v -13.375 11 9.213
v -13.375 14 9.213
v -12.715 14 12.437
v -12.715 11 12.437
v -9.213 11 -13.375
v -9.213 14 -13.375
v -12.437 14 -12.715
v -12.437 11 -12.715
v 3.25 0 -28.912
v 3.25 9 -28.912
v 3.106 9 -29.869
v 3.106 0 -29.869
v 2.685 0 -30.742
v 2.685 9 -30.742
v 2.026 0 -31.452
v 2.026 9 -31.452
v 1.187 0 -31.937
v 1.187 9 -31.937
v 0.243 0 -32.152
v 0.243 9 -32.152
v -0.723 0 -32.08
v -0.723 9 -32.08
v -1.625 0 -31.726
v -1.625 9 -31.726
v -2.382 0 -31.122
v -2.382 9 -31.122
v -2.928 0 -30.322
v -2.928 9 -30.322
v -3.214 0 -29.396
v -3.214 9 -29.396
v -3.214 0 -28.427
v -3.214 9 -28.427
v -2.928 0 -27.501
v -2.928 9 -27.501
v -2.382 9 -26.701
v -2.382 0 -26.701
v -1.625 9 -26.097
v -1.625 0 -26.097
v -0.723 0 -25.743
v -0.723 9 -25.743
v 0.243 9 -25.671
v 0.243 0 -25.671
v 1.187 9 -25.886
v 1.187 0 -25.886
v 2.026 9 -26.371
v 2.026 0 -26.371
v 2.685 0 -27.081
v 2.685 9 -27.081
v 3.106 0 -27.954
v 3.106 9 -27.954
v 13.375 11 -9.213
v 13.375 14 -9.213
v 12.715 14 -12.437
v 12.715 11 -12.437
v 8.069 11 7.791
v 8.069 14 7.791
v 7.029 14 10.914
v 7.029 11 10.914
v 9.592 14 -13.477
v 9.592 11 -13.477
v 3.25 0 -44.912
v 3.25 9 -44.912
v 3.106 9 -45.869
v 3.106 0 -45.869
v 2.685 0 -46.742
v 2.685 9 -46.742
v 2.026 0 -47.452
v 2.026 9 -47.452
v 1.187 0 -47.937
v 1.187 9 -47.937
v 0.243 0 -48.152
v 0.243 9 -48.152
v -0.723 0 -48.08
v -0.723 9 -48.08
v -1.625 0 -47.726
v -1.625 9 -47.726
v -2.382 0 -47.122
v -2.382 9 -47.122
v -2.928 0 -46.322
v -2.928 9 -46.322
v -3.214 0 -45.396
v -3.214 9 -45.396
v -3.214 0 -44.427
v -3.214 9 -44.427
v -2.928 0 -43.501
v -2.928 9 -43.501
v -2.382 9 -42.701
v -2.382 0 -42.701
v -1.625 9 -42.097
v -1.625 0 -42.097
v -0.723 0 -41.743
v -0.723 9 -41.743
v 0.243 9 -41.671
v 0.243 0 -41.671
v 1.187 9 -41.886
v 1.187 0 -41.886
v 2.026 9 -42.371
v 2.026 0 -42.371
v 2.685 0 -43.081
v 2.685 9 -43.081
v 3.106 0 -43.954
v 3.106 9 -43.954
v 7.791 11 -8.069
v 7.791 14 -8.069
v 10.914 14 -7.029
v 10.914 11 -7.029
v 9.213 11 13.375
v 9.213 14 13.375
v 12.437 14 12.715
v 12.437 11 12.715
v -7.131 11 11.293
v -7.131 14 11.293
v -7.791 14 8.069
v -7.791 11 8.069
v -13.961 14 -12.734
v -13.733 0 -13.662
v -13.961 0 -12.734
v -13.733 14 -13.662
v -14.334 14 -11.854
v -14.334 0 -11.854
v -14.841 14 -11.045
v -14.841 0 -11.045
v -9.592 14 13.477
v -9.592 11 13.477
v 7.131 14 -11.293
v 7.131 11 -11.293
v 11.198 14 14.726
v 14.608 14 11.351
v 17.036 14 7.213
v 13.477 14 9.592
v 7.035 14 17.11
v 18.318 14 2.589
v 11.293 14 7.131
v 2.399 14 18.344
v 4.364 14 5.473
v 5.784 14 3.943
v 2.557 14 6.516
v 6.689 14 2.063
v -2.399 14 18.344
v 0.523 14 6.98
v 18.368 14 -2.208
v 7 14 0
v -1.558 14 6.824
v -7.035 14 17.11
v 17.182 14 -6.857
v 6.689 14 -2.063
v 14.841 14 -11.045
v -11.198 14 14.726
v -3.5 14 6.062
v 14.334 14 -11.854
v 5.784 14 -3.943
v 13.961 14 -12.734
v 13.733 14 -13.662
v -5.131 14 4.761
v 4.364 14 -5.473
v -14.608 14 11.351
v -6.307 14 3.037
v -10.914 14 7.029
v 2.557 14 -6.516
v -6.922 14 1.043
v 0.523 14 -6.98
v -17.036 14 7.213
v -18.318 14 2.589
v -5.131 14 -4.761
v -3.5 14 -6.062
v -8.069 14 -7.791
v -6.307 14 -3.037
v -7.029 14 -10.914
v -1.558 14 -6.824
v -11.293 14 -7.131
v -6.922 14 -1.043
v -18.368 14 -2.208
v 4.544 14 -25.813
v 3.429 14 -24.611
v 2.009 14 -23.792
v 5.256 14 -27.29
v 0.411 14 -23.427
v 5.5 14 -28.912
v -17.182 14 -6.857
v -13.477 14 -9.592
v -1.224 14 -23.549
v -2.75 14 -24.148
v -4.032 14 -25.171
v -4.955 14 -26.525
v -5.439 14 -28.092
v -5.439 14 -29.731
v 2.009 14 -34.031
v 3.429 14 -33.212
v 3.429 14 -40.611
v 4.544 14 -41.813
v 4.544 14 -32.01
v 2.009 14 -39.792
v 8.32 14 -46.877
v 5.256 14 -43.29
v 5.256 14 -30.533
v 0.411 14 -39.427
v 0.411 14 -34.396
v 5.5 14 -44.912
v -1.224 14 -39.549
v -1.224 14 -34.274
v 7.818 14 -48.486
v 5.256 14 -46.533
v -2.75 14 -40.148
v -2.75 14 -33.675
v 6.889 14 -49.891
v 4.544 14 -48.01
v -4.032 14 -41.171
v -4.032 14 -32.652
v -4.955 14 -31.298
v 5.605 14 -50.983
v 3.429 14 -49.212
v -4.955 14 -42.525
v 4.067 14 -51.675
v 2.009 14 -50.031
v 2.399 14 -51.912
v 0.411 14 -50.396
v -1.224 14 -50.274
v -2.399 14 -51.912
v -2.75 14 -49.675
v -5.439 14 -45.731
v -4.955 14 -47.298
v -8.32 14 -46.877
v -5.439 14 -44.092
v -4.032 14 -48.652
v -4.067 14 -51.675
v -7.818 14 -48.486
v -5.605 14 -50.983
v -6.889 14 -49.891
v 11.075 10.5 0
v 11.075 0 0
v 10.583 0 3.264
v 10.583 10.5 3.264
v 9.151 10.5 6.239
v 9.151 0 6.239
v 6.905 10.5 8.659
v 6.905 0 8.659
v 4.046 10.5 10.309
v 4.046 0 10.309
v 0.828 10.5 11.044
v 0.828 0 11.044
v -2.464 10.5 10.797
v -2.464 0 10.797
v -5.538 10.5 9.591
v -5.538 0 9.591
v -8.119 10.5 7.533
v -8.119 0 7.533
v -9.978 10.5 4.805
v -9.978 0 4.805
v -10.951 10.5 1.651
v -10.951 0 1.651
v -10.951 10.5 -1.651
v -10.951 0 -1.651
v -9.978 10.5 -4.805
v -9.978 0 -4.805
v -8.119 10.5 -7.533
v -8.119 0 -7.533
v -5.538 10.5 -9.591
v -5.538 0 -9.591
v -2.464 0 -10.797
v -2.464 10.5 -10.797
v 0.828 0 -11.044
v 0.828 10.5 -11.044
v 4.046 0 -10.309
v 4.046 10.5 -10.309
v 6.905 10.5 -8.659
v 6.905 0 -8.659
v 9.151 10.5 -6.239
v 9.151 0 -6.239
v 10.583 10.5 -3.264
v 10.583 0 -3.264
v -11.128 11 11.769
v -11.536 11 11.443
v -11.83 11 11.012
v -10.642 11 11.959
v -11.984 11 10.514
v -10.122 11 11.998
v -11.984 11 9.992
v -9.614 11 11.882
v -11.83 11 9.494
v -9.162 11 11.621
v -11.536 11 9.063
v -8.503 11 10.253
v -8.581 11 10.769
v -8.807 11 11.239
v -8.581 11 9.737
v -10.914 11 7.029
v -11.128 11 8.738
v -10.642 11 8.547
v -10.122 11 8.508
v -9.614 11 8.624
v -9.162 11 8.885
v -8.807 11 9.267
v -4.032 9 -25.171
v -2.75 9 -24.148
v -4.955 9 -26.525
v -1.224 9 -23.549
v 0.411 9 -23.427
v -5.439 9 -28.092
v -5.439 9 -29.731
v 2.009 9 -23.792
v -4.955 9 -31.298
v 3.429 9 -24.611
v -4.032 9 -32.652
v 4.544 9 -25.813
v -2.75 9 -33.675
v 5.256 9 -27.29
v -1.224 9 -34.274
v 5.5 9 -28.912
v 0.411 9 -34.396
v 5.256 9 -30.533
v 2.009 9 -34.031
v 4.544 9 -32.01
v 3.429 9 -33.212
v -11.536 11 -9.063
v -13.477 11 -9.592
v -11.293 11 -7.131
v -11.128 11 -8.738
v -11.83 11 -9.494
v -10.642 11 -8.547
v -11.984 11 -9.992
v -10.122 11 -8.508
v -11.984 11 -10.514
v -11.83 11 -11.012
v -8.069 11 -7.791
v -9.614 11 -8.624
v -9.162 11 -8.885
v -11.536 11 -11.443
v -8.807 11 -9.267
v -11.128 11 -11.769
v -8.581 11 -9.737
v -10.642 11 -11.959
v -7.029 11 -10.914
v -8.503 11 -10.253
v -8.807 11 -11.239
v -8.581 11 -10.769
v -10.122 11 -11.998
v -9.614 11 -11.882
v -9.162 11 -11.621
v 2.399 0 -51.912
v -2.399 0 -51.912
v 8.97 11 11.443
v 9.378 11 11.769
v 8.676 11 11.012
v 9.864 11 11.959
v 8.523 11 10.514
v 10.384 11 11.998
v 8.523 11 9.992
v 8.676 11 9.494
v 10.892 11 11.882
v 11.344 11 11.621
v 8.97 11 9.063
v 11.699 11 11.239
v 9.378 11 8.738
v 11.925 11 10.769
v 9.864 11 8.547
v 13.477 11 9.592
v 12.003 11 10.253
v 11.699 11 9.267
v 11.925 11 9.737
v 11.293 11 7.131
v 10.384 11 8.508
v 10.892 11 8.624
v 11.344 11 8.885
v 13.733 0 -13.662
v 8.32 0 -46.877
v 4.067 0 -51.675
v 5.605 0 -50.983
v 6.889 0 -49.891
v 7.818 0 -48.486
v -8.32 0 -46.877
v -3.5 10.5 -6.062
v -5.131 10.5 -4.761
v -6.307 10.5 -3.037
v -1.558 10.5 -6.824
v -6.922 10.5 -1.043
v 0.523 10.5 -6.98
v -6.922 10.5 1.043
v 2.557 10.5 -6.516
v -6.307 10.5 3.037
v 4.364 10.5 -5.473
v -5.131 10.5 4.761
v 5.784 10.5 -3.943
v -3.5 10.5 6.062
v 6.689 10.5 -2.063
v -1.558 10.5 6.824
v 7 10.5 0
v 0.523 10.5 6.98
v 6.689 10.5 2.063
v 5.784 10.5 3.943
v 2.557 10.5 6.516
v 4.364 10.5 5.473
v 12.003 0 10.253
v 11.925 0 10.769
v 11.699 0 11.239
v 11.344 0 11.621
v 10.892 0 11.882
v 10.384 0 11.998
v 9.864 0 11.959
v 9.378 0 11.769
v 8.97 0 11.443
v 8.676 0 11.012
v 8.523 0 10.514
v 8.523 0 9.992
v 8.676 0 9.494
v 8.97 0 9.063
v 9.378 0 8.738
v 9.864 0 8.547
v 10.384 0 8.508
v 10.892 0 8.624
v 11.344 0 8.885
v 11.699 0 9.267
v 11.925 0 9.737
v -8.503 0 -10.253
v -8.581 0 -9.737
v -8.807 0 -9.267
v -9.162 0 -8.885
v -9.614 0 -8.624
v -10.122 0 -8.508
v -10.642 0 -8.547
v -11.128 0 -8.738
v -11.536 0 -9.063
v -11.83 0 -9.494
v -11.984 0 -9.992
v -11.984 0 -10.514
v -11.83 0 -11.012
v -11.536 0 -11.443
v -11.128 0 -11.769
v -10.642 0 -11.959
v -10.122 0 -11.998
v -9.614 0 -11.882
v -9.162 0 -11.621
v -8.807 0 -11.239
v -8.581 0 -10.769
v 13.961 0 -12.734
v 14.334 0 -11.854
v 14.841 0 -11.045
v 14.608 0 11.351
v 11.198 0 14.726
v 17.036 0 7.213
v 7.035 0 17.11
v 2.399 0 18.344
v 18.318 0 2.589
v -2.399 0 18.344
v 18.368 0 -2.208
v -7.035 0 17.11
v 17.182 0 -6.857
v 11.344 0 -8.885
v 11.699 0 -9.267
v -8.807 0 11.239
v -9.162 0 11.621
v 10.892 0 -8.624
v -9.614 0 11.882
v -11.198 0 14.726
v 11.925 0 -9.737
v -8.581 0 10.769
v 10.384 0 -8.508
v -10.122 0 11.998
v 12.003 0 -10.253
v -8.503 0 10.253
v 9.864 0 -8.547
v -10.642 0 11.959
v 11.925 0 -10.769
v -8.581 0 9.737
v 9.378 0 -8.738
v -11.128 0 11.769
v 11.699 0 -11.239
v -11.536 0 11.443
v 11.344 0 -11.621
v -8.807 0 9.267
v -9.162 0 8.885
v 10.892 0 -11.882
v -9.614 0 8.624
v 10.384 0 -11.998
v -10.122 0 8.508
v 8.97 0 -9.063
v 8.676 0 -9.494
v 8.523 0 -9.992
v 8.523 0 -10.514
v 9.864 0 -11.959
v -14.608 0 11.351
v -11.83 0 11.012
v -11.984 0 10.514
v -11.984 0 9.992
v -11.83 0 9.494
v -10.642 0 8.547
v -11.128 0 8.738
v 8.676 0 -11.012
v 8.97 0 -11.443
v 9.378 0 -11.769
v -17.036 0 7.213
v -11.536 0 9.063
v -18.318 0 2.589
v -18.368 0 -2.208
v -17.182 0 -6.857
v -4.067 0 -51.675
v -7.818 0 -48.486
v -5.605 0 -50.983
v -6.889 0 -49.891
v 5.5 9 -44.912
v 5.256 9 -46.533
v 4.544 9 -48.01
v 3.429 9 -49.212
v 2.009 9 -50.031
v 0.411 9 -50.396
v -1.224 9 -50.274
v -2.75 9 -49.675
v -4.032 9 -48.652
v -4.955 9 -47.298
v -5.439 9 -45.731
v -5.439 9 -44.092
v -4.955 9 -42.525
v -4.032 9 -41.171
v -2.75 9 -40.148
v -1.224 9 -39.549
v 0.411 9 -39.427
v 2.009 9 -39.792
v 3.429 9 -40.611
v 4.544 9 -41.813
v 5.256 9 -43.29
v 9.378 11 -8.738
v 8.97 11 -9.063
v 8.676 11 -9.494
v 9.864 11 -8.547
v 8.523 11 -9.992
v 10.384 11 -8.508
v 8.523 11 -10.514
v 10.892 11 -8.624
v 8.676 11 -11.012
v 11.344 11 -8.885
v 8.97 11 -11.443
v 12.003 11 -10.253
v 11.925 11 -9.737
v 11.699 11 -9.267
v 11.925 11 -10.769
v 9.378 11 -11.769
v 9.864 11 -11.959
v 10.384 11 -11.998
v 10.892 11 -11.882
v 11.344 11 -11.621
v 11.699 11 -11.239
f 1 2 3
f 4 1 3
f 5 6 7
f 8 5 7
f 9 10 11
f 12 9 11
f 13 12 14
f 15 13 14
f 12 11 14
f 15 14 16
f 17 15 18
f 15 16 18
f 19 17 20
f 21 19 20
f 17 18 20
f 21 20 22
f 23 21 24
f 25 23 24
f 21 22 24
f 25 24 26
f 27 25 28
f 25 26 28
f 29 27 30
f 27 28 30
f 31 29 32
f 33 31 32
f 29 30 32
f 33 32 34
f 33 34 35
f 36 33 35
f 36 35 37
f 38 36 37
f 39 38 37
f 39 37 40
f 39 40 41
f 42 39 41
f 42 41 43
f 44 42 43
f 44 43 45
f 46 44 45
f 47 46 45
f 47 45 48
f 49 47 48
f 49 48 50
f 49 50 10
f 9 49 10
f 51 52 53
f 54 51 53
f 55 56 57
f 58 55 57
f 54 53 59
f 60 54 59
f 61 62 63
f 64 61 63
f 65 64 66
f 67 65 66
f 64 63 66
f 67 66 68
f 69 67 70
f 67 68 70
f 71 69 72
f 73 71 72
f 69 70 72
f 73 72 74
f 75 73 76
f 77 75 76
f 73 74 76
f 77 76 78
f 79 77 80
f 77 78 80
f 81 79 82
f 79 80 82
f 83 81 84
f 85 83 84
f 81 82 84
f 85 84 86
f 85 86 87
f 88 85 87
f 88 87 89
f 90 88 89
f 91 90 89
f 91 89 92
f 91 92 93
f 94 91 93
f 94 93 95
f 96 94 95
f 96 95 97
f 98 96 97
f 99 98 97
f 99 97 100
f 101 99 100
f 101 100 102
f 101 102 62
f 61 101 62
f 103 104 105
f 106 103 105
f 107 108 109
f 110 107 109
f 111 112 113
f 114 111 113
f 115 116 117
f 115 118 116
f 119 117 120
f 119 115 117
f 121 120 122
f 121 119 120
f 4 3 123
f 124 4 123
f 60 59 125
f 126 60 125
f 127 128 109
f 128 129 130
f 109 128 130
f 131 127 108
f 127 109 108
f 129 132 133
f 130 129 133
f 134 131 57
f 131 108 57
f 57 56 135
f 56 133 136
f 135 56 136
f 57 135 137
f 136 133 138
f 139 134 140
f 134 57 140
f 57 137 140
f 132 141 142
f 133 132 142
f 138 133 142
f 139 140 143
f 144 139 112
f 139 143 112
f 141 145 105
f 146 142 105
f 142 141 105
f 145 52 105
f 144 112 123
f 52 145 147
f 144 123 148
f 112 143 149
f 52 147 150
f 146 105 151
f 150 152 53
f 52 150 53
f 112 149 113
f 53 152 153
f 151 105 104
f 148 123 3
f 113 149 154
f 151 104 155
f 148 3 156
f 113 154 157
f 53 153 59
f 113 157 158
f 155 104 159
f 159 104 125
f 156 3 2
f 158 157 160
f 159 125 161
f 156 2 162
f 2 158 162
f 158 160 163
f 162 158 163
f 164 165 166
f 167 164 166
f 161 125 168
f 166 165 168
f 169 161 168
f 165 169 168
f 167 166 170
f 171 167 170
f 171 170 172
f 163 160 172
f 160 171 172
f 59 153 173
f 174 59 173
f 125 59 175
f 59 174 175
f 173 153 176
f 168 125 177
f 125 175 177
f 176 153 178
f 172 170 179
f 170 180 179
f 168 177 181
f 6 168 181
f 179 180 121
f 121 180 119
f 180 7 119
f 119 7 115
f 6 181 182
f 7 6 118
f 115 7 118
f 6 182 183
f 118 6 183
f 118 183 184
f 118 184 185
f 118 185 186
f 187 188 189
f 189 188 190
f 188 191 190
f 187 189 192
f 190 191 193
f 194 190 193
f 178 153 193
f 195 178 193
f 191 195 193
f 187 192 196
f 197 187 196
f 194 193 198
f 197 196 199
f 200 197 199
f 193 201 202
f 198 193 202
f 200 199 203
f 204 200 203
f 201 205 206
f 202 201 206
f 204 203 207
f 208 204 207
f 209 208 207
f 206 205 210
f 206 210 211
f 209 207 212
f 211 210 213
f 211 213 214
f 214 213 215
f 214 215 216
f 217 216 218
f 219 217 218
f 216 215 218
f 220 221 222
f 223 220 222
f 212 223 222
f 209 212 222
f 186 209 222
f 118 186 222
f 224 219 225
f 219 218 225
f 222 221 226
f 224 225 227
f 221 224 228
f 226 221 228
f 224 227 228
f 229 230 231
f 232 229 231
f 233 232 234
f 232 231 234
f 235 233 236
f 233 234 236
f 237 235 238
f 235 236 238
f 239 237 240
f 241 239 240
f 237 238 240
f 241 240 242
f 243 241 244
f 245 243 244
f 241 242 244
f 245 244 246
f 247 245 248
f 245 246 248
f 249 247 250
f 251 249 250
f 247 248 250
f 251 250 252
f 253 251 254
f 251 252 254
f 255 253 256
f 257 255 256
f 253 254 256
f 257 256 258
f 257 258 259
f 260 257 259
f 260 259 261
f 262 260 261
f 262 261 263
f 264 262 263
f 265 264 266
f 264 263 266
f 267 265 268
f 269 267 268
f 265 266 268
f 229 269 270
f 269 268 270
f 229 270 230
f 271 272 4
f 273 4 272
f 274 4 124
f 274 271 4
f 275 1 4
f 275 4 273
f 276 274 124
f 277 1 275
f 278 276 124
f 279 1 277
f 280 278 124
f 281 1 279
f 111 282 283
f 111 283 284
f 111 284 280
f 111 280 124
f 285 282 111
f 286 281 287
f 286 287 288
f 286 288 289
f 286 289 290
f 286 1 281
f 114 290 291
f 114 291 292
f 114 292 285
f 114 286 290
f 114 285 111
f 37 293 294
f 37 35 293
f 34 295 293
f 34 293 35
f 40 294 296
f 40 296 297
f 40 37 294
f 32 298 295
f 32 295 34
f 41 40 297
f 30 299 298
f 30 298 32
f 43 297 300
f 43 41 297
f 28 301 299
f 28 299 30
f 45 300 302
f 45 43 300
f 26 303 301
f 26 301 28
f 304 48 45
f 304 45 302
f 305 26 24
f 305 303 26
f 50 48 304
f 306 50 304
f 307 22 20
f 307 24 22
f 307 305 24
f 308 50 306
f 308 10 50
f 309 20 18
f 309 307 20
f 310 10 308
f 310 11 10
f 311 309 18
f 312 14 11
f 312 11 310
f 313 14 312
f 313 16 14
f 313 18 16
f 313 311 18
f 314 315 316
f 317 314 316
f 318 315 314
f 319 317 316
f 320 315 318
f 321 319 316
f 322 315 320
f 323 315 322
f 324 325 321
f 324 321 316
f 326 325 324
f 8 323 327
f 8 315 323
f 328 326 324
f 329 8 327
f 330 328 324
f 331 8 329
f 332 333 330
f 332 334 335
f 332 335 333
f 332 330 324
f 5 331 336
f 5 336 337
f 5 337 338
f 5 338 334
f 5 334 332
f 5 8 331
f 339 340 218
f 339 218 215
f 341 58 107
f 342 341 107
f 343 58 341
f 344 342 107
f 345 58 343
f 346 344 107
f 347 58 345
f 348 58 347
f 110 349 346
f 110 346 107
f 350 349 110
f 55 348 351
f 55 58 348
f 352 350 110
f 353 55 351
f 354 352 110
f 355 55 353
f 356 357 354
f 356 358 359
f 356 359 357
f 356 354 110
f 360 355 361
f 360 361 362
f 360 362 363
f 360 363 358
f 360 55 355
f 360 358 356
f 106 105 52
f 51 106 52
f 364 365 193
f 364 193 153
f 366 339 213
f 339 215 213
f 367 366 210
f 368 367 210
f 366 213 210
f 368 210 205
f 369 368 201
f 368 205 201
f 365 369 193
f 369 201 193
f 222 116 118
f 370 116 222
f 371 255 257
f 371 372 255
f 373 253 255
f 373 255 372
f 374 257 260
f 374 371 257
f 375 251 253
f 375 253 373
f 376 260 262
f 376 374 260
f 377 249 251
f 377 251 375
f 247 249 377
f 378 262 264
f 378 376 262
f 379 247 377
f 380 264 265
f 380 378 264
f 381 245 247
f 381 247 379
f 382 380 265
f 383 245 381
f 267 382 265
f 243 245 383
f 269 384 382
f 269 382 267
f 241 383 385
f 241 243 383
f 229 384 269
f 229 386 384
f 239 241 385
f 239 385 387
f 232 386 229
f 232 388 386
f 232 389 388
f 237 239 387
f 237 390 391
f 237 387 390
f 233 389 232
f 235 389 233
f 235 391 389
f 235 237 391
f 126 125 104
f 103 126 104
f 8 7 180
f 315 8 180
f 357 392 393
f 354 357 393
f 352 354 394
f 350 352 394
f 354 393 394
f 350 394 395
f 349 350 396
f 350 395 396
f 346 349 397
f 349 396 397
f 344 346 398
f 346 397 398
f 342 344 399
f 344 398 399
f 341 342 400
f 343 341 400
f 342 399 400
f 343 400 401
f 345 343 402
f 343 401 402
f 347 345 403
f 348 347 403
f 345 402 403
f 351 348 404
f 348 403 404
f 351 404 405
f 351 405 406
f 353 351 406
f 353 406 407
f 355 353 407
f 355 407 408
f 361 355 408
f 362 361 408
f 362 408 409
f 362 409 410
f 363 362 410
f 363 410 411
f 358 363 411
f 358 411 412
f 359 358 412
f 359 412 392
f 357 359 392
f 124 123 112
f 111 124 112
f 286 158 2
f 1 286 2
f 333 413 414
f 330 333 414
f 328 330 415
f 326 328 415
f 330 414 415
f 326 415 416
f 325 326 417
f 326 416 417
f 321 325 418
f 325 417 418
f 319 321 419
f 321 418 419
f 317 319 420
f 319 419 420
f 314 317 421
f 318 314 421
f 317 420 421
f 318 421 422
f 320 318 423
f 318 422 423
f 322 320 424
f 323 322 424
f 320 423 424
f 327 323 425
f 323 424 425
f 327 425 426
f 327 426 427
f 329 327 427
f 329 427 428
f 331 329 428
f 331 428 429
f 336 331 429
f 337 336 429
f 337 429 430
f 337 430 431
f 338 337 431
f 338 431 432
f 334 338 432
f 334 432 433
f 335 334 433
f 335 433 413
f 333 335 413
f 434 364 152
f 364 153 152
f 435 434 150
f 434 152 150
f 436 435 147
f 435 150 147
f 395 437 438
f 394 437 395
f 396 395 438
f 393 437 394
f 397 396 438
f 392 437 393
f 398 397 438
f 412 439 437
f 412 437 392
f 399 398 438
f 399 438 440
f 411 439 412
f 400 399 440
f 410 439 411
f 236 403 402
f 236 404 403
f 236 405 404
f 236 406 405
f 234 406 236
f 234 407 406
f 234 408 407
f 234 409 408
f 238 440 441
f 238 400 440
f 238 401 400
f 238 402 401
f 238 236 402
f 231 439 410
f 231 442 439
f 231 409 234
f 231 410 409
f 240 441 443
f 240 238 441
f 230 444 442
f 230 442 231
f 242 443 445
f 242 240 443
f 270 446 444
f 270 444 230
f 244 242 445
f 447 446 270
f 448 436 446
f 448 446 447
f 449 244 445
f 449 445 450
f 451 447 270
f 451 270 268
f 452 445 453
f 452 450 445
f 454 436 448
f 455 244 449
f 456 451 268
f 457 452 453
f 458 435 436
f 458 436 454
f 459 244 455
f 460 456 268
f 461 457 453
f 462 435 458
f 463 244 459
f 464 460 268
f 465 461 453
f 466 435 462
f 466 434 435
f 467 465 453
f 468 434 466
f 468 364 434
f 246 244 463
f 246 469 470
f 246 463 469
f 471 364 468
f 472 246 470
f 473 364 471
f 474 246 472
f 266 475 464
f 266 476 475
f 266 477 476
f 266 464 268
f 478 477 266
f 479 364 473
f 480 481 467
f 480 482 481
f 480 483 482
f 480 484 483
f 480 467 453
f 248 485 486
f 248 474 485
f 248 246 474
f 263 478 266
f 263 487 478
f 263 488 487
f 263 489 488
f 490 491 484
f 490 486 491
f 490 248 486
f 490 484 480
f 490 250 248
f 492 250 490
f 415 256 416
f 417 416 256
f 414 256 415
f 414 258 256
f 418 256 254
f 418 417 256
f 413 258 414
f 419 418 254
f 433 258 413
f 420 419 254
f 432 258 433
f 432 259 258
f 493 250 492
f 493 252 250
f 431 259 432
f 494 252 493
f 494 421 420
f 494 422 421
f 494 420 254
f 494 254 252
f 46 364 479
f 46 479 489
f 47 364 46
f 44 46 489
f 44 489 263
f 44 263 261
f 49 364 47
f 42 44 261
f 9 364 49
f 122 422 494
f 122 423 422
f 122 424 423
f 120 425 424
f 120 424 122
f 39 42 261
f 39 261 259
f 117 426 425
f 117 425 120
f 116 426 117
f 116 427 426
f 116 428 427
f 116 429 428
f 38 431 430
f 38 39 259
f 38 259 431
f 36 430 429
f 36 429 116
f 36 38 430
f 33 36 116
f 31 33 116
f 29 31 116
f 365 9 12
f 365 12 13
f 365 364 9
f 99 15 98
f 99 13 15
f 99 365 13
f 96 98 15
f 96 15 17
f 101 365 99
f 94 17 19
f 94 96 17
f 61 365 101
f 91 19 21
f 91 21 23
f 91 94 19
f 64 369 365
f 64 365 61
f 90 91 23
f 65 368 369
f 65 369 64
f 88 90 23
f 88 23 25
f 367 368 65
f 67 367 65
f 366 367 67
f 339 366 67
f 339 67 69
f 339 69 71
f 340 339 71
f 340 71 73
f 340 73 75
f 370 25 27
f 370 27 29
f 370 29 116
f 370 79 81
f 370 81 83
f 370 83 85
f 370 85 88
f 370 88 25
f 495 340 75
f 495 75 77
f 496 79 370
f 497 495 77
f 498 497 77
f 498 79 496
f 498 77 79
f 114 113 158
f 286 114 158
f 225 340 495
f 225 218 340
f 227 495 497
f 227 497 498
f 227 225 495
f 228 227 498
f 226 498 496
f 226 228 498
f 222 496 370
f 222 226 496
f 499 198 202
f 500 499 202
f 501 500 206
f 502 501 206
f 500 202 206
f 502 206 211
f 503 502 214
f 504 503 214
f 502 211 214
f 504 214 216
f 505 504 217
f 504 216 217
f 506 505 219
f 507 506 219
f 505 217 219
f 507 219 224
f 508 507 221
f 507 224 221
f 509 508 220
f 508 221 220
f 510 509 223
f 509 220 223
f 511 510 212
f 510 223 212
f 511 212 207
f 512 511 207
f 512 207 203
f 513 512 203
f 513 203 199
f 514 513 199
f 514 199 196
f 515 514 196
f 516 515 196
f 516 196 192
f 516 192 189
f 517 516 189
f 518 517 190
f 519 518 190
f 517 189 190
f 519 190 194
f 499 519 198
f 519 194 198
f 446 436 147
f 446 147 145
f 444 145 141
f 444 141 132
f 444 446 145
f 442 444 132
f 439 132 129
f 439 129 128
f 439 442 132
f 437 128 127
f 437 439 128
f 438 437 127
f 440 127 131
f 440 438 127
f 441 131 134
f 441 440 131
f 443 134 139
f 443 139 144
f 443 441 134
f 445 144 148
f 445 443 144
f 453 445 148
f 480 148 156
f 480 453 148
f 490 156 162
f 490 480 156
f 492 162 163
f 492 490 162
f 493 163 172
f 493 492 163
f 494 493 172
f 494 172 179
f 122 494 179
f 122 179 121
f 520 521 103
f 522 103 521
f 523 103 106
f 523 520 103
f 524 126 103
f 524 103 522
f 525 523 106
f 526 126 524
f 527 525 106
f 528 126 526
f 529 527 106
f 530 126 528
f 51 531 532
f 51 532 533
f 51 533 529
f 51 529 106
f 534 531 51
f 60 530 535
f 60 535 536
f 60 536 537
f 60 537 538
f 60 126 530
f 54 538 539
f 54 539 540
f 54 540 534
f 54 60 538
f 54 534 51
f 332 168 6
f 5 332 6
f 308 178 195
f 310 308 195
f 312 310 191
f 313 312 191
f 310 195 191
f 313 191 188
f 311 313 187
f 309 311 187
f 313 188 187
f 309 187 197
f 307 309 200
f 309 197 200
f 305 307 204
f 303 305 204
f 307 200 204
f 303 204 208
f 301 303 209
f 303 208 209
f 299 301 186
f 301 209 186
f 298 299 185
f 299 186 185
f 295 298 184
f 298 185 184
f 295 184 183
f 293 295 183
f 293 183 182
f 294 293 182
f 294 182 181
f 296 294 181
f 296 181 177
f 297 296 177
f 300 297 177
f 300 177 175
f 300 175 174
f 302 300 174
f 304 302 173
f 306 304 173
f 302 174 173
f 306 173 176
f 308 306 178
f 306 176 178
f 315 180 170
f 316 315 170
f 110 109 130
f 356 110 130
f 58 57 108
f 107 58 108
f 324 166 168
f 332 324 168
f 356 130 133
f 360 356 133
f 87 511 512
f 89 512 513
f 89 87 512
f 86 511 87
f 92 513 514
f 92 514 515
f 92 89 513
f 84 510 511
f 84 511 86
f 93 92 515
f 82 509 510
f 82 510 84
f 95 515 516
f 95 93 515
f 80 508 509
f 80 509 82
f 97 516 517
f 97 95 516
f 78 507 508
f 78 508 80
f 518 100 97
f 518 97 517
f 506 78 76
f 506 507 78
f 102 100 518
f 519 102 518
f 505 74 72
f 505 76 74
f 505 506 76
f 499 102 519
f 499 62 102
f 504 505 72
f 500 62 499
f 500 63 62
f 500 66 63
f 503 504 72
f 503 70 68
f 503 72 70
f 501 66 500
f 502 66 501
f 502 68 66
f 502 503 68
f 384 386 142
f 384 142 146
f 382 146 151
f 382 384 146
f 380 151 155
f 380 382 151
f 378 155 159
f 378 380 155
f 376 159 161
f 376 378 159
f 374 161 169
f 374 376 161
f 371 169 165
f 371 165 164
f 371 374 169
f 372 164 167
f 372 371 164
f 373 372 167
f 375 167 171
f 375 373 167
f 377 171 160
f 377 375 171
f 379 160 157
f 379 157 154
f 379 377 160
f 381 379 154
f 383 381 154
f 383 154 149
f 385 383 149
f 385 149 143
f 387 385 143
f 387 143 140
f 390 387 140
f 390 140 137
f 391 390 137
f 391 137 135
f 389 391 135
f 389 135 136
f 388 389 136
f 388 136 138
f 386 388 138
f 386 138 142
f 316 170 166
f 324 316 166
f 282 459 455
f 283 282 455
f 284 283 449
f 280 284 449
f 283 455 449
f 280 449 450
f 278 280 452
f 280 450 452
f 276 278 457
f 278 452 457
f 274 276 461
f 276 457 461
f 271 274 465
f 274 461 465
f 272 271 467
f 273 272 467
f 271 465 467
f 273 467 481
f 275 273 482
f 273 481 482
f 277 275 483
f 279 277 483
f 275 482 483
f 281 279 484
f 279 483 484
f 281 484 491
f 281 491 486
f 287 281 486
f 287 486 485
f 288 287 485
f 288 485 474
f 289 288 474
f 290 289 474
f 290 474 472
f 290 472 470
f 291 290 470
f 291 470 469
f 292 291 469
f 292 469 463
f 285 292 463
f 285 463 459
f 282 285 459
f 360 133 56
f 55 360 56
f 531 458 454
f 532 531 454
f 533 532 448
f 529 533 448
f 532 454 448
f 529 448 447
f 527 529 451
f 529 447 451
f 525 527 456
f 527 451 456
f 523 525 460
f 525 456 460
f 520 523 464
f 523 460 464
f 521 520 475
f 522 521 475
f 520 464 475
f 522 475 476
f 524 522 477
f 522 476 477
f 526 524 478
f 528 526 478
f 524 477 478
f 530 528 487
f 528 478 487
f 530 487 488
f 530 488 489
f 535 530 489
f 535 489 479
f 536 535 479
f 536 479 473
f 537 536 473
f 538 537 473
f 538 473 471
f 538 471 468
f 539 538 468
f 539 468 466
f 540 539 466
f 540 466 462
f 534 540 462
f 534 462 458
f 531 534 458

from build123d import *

# Parameters (mm, degrees)
SKETCH1_R           = 7
BOSS_EXTRUDE1_DEPTH = 14
SKETCH2_R           = 11.075
CUT_EXTRUDE1_DEPTH  = 10.5
SKETCH4_R           = 1.75
CUT_EXTRUDE4_DEPTH  = 15
CUT_EXTRUDE5_DEPTH  = 3
SKETCH6_R           = 3.25
CUT_EXTRUDE6_DEPTH  = 15
SKETCH7_R           = 5.5
CUT_EXTRUDE7_DEPTH  = 5
FILLET4_R           = 6


with BuildPart() as part:
    # Sketch1 → Boss-Extrude1 (new body)
    with BuildSketch(Plane(origin=(0, 0, 0), x_dir=(1, 0, 0), z_dir=(0, 1, 0))):
        with BuildLine():
            Line((-7.5, 51.911534525), (7.5, 51.911534525))
            Line((7.5, 51.911534525), (13.985690309, 12.109932558))
            ThreePointArc((13.985690309, 12.109932558), (0, -18.5), (-13.985690309, 12.109932558))
            Line((-13.985690309, 12.109932558), (-7.5, 51.911534525))
        make_face()
        Circle(SKETCH1_R, mode=Mode.SUBTRACT)
    extrude(amount=BOSS_EXTRUDE1_DEPTH)

    # Sketch2 → Cut-Extrude1 (cut)
    with BuildSketch(Plane.XZ):
        Circle(SKETCH2_R)
    extrude(amount=-CUT_EXTRUDE1_DEPTH, mode=Mode.SUBTRACT)

    # Sketch4 → Cut-Extrude4 (cut, through all)
    with BuildSketch(Plane.XZ):
        with Locations((10.253048327, 10.253048327)):
            Circle(SKETCH4_R)
        with Locations((10.253048327, -10.253048327)):
            Circle(SKETCH4_R)
        with Locations((-10.253048327, -10.253048327)):
            Circle(SKETCH4_R)
        with Locations((-10.253048327, 10.253048327)):
            Circle(SKETCH4_R)
    extrude(amount=-CUT_EXTRUDE4_DEPTH, mode=Mode.SUBTRACT)

    # Sketch5 → Cut-Extrude5 (cut)
    with BuildSketch(Plane(origin=(0, 14, 0), x_dir=(1, 0, 0), z_dir=(0, 1, 0))):
        Polygon((13.375361377, 9.2132593), (12.714688564, 12.437156233), (9.592375514, 13.47694526), (7.130735278, 11.292837354), (7.79140809, 8.068940421), (10.91372114, 7.029151394), align=None)
        Polygon((-9.2132593, 13.375361377), (-12.437156233, 12.714688564), (-13.47694526, 9.592375514), (-11.292837354, 7.130735278), (-8.068940421, 7.79140809), (-7.029151394, 10.91372114), align=None)
        Polygon((9.2132593, -13.375361377), (12.437156233, -12.714688564), (13.47694526, -9.592375514), (11.292837354, -7.130735278), (8.068940421, -7.79140809), (7.029151394, -10.91372114), align=None)
        Polygon((-13.375361377, -9.2132593), (-12.714688564, -12.437156233), (-9.592375514, -13.47694526), (-7.130735278, -11.292837354), (-7.79140809, -8.068940421), (-10.91372114, -7.029151394), align=None)
    extrude(amount=-CUT_EXTRUDE5_DEPTH, mode=Mode.SUBTRACT)

    # Sketch6 → Cut-Extrude6 (cut, through all)
    with BuildSketch(Plane(origin=(0, 14, 0), x_dir=(1, 0, 0), z_dir=(0, 1, 0))):
        with Locations((0, 44.911534525)):
            Circle(SKETCH6_R)
        with Locations((0, 28.911534525)):
            Circle(SKETCH6_R)
    extrude(amount=-CUT_EXTRUDE6_DEPTH, mode=Mode.SUBTRACT)

    # Sketch7 → Cut-Extrude7 (cut)
    with BuildSketch(Plane(origin=(0, 14, 0), x_dir=(1, 0, 0), z_dir=(0, 1, 0))):
        with Locations((0, 28.911534525)):
            Circle(SKETCH7_R)
        with Locations((0, 44.911534525)):
            Circle(SKETCH7_R)
    extrude(amount=-CUT_EXTRUDE7_DEPTH, mode=Mode.SUBTRACT)

    # Fillet4
    fillet4_edges = [part.edges().sort_by_distance(p)[0] for p in [
        (-7.5, 7, -51.911534525),
        (7.5, 7, -51.911534525),
        (13.985690309, 7, -12.109932558),
        (-13.985690309, 7, -12.109932558),
    ]]
    fillet(fillet4_edges, radius=FILLET4_R)


solid = part.part
